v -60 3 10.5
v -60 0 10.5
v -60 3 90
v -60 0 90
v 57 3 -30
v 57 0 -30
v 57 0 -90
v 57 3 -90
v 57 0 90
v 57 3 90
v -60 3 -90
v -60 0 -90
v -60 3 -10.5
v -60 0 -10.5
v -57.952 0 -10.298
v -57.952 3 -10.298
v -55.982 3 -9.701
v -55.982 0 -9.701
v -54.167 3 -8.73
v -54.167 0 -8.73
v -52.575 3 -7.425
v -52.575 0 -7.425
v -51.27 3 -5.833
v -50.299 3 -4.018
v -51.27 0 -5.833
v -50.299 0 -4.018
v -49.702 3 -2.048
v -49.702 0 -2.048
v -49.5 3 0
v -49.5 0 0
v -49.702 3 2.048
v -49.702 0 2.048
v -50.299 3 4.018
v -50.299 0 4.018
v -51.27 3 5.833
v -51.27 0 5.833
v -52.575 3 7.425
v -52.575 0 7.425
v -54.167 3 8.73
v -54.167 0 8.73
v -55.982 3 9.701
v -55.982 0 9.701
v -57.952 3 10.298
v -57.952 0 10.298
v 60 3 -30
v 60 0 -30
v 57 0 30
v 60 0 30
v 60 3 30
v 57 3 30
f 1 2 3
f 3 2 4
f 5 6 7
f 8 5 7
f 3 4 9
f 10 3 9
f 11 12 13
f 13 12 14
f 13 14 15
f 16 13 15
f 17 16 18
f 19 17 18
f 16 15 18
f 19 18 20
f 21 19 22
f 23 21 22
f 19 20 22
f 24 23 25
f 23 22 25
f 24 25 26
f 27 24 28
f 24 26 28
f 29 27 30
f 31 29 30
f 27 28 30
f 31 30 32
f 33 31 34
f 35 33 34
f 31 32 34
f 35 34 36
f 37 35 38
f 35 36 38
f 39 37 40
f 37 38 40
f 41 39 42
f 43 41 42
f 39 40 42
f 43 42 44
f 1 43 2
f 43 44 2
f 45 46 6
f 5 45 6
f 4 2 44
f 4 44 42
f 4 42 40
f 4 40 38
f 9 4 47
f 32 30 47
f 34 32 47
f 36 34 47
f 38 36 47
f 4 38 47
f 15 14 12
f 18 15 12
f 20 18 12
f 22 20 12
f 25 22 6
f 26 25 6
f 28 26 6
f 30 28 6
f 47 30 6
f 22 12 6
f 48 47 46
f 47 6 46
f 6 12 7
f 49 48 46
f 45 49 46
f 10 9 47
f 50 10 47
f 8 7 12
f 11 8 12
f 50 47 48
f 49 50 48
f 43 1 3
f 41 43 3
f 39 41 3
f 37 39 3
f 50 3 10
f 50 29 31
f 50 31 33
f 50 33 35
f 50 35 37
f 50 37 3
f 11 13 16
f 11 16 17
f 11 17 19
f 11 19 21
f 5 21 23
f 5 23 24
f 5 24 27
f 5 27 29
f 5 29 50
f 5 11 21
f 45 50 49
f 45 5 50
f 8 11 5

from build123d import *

# Parameters (mm, degrees)
BOSS_EXTRUDE2_DEPTH = 3


with BuildPart() as part:
    # Sketch1 → Boss-Extrude2 (new body)
    with BuildSketch(Plane(origin=(0, 0, 0), x_dir=(1, 0, 0), z_dir=(0, 1, 0))):
        with BuildLine():
            Line((-60, -10.5), (-60, -90))
            Line((-60, -90), (57, -90))
            Line((57, -90), (57, -30))
            Line((57, -30), (60, -30))
            Line((60, -30), (60, 30))
            Line((60, 30), (57, 30))
            Line((57, 30), (57, 90))
            Line((57, 90), (-60, 90))
            Line((-60, 90), (-60, 10.5))
            ThreePointArc((-60, 10.5), (-49.5, 0), (-60, -10.5))
        make_face()
    extrude(amount=BOSS_EXTRUDE2_DEPTH)


solid = part.part
